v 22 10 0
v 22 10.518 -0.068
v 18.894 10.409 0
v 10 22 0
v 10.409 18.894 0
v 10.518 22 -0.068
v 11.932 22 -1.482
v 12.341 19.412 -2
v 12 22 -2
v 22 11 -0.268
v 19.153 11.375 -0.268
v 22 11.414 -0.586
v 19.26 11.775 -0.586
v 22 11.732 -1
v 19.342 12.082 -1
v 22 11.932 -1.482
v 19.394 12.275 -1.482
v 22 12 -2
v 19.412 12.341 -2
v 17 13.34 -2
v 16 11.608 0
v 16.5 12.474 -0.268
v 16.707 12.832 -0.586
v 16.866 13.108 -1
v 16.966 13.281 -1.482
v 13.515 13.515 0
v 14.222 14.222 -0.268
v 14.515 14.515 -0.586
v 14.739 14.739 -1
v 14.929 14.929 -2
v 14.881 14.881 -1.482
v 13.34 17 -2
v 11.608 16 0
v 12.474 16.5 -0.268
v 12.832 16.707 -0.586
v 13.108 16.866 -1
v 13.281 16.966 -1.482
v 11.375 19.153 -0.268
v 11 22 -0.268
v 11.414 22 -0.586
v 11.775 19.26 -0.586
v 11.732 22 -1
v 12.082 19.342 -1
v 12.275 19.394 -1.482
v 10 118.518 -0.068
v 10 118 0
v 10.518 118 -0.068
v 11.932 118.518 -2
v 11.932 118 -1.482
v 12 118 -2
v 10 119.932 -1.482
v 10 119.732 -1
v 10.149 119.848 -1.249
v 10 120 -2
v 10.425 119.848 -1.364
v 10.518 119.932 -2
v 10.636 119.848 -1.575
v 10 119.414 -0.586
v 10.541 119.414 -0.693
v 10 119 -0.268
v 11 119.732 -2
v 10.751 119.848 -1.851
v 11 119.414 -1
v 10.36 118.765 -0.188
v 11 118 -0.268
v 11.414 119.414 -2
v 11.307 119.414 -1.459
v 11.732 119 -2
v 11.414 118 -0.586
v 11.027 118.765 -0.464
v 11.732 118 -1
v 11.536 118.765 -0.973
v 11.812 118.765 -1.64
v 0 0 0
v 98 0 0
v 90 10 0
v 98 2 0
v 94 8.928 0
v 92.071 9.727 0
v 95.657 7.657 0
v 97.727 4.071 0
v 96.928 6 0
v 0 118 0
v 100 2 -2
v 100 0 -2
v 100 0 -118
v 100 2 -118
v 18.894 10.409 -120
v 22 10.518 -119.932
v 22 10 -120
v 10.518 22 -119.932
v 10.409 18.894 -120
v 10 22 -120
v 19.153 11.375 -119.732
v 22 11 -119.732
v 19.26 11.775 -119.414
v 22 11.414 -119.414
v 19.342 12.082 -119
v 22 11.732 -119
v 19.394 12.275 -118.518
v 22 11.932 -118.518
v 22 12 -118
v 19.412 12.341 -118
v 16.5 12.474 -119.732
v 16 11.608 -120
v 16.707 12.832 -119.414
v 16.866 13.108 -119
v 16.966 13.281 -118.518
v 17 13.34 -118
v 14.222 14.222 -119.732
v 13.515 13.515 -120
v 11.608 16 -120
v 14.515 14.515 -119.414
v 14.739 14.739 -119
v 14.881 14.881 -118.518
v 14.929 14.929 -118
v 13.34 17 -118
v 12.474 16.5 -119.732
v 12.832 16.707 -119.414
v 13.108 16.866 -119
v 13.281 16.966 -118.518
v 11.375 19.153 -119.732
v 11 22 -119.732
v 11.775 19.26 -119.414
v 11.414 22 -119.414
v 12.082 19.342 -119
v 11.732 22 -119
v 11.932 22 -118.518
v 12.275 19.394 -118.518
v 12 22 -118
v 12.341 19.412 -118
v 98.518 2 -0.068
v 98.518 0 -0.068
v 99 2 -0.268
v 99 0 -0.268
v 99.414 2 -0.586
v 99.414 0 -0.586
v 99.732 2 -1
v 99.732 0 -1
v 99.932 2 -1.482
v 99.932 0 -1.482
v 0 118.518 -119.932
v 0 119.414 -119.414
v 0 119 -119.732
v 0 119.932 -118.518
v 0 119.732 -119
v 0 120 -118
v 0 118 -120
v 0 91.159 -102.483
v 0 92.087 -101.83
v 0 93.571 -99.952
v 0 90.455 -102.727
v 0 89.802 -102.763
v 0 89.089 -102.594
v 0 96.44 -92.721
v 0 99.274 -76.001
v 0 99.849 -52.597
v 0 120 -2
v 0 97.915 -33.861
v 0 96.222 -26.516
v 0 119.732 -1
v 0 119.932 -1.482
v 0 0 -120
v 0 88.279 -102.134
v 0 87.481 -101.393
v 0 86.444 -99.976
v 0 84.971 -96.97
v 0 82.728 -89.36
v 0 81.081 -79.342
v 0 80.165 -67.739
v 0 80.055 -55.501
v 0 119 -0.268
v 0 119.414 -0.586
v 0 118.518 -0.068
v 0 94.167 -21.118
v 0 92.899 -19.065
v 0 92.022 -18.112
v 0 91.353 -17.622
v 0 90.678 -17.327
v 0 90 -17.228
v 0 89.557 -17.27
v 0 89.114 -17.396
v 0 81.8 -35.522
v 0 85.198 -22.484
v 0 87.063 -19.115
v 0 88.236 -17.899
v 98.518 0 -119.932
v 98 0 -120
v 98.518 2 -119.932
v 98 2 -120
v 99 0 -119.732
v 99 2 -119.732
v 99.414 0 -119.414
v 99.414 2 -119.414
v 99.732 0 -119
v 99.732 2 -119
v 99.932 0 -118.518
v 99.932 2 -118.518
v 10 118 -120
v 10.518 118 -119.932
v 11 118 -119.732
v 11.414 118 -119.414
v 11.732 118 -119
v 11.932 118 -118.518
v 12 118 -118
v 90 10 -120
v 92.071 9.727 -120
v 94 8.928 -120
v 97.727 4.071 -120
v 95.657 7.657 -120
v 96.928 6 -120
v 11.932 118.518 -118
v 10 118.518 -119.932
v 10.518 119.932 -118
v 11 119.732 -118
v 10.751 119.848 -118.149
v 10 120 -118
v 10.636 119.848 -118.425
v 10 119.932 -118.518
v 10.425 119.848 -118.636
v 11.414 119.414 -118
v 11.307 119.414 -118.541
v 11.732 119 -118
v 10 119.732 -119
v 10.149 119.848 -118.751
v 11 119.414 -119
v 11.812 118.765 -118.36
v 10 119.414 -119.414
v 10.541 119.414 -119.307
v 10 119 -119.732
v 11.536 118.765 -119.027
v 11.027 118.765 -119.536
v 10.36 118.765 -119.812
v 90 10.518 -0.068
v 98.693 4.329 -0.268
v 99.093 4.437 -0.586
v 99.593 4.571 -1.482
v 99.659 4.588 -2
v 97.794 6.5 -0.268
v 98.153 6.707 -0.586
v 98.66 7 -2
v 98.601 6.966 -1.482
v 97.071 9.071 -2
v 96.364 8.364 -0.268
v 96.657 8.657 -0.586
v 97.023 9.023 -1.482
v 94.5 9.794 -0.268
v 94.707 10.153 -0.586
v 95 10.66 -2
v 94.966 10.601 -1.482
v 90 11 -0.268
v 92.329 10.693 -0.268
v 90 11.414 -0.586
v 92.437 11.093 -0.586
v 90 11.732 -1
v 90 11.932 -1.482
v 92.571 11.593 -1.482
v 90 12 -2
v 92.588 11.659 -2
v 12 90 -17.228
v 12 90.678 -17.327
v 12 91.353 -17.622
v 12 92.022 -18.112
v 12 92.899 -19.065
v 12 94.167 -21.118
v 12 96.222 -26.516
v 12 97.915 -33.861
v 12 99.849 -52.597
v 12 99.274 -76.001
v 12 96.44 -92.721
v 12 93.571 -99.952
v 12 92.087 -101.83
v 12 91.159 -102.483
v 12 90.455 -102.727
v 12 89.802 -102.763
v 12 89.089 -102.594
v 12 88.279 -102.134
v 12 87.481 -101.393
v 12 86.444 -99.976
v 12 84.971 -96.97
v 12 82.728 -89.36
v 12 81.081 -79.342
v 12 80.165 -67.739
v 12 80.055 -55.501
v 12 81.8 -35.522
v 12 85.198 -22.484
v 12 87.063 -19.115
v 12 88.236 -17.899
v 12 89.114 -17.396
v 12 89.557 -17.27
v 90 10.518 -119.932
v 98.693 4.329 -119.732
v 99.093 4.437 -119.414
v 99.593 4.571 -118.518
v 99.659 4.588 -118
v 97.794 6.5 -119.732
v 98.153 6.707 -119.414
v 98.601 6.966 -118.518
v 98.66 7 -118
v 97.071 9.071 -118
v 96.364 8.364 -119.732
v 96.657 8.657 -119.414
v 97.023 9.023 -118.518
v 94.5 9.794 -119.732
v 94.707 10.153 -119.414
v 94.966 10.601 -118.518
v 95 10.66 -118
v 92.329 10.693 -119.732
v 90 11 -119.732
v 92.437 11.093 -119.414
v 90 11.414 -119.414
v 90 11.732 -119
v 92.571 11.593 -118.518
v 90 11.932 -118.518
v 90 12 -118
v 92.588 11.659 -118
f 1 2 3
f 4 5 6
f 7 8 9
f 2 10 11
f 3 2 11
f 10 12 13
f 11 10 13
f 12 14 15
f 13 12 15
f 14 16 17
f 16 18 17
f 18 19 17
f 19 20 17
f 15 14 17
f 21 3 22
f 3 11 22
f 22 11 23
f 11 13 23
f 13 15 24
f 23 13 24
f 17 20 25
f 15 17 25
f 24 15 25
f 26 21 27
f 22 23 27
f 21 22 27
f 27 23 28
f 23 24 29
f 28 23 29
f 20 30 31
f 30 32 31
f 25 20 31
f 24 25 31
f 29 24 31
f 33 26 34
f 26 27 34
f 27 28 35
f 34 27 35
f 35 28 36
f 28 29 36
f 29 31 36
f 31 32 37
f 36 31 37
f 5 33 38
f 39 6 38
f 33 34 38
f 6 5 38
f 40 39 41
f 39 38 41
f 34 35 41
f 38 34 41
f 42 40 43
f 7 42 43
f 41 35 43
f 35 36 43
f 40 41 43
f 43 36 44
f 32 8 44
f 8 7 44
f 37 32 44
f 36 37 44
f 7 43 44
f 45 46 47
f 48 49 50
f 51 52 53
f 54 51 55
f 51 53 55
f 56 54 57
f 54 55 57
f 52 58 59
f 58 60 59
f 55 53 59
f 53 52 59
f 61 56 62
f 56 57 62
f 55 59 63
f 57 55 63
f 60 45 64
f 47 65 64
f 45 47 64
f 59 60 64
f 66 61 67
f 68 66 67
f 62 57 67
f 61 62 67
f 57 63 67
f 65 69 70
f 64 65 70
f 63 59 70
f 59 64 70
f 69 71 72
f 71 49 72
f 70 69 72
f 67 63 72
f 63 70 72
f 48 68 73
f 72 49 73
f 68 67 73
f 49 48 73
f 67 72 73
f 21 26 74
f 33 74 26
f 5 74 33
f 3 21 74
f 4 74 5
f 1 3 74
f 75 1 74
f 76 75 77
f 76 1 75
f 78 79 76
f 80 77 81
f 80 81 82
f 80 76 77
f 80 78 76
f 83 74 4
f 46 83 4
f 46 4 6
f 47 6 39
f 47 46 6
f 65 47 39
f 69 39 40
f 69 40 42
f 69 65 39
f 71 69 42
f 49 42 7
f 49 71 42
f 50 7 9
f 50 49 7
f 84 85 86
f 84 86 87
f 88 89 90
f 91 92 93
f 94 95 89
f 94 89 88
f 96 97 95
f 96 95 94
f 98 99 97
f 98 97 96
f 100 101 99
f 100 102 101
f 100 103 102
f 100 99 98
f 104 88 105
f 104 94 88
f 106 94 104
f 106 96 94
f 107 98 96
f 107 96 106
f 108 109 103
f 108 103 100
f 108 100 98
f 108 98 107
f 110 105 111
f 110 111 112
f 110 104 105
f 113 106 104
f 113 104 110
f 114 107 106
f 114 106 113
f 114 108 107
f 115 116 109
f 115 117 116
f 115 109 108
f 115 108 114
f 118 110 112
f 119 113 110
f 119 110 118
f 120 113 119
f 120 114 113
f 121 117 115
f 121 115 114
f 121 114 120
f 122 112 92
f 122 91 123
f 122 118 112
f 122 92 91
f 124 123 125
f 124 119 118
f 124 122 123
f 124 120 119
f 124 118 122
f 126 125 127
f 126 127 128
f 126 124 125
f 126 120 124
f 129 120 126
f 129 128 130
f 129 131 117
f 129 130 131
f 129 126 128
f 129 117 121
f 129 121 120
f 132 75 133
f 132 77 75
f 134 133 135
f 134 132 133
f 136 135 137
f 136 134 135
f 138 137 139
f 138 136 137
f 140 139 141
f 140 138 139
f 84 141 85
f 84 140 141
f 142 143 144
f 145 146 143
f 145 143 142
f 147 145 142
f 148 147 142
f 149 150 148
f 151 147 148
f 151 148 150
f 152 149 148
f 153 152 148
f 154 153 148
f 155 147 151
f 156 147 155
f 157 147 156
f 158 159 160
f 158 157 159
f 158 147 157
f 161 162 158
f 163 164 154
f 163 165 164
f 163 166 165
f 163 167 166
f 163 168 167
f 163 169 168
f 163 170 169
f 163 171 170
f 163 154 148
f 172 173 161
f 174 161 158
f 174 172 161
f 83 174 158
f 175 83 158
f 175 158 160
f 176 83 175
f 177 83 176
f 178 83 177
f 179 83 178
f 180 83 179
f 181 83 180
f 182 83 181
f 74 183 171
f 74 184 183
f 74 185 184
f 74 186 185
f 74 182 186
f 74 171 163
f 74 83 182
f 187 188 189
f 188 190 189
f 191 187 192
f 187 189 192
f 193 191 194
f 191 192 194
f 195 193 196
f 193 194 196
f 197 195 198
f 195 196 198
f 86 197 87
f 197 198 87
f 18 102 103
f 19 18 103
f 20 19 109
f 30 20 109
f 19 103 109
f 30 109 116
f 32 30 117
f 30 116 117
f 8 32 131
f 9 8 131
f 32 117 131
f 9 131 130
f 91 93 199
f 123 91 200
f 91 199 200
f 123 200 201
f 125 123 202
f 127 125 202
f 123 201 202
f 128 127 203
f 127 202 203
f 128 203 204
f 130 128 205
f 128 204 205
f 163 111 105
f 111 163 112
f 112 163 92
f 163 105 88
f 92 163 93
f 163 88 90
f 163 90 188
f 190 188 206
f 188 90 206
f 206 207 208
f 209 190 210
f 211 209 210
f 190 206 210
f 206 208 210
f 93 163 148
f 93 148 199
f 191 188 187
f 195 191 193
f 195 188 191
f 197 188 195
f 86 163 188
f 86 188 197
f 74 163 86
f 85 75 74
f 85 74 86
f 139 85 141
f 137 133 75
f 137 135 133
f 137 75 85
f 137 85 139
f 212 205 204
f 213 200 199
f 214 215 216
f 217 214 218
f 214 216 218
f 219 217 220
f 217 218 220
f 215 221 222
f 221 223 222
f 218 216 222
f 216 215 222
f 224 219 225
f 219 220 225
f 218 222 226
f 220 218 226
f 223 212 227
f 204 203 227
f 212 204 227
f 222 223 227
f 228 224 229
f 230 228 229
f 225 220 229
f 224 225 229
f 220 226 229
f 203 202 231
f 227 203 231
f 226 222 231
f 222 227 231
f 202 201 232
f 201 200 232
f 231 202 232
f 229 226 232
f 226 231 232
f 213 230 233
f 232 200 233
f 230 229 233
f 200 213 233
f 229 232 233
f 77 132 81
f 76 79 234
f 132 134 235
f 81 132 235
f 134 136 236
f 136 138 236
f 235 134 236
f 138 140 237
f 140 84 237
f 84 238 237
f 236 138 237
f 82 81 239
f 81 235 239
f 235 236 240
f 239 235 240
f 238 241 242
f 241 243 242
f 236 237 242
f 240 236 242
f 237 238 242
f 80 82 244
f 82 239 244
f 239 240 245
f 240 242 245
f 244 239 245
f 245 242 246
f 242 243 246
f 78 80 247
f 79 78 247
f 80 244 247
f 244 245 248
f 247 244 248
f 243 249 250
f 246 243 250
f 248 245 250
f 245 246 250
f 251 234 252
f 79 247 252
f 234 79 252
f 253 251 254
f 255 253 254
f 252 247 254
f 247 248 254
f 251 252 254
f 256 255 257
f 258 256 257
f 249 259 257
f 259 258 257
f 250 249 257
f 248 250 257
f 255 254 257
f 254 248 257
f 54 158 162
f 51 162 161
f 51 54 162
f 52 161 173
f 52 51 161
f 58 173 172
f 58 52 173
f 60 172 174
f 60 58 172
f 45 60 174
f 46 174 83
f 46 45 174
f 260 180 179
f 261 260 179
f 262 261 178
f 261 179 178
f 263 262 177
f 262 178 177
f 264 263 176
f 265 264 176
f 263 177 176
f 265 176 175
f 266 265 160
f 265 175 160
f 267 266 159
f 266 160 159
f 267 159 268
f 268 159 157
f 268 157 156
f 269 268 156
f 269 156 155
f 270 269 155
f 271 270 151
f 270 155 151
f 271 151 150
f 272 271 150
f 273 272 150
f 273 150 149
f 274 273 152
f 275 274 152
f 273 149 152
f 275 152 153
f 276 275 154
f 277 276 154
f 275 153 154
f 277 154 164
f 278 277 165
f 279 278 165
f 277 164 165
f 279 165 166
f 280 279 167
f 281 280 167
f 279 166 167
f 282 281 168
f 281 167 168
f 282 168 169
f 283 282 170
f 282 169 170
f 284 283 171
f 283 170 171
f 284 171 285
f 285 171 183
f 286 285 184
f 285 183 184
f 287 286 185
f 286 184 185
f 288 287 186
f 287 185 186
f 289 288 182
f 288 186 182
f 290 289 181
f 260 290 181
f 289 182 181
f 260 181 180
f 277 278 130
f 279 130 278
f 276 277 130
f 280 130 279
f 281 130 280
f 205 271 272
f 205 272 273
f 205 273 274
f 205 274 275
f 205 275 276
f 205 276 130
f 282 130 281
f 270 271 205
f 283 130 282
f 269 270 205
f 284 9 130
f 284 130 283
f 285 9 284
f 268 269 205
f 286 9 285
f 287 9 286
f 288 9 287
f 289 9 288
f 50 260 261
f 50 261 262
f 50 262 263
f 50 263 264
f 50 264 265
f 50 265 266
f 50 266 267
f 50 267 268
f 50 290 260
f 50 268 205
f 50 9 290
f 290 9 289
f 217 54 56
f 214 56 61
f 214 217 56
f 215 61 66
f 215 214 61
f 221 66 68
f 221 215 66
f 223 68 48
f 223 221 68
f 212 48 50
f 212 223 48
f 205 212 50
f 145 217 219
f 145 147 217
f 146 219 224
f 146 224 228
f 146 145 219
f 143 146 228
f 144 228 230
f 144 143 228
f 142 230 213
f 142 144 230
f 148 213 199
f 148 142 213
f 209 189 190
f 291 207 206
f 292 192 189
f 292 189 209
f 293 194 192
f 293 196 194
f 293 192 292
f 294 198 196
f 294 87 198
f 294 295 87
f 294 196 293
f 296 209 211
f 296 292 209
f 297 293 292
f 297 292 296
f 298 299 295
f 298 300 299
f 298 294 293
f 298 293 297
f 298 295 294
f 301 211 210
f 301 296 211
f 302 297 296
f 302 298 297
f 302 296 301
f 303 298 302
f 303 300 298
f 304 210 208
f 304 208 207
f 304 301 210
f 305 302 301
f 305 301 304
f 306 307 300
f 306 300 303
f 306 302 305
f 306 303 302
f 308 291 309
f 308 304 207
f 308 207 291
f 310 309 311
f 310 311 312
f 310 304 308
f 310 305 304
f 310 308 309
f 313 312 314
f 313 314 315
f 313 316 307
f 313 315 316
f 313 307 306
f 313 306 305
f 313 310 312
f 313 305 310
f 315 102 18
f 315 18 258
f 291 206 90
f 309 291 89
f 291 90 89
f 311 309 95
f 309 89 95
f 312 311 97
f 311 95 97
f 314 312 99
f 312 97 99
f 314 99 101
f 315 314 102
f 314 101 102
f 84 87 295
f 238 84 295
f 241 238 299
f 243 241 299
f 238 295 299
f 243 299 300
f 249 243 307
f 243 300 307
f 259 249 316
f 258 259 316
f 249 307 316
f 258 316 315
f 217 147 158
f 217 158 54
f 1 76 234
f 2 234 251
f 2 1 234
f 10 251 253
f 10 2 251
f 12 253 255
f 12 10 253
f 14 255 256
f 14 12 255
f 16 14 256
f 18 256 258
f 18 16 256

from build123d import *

# Parameters (mm, degrees)
ESQUISSE1_W             = 12
ESQUISSE1_H             = 108
ESQUISSE1_W_2           = 100
ESQUISSE1_H_2           = 12
BOSS_EXTRU_1_DEPTH      = 120
ESQUISSE2_RX            = 42.771597922
ESQUISSE2_RY            = 10
ENL_V_MAT_EXTRU_1_DEPTH = 12
CONG_1_R                = 10
CONG_2_R                = 10
CONG_3_R                = 2
CONG_4_R                = 2
CONG_5_R                = 2


with BuildPart() as part:
    # Esquisse1 → Boss.-Extru.1 (new body)
    with BuildSketch(Plane.XY):
        with Locations((6, 66)):
            Rectangle(ESQUISSE1_W, ESQUISSE1_H)
        with Locations((50, 6)):
            Rectangle(ESQUISSE1_W_2, ESQUISSE1_H_2)
    extrude(amount=-BOSS_EXTRU_1_DEPTH)

    # Esquisse2 → Enlèv. mat.-Extru.1 (cut)
    with BuildSketch(Plane.ZY):
        with Locations(Location((-60, 90), (0, 0, 0))):
            Ellipse(ESQUISSE2_RX, ESQUISSE2_RY)
    extrude(amount=-ENL_V_MAT_EXTRU_1_DEPTH, mode=Mode.SUBTRACT)

    # Congé1
    cong_1_edges = [part.edges().sort_by_distance(p)[0] for p in [
        (100, 12, -60),
    ]]
    fillet(cong_1_edges, radius=CONG_1_R)

    # Congé2
    cong_2_edges = [part.edges().sort_by_distance(p)[0] for p in [
        (12, 12, -60),
    ]]
    fillet(cong_2_edges, radius=CONG_2_R)

    # Congé3
    cong_3_edges = [part.edges().sort_by_distance(p)[0] for p in [
        (100, 1, 0),
        (97.071067812, 9.071067812, 0),
        (56, 12, 0),
        (12, 71, 0),
        (14.928932188, 14.928932188, 0),
    ]]
    fillet(cong_3_edges, radius=CONG_3_R)

    # Congé4
    cong_4_edges = [part.edges().sort_by_distance(p)[0] for p in [
        (100, 1, -120),
        (97.071067812, 9.071067812, -120),
        (56, 12, -120),
        (12, 71, -120),
        (14.928932188, 14.928932188, -120),
    ]]
    fillet(cong_4_edges, radius=CONG_4_R)

    # Congé5
    cong_5_edges = [part.edges().sort_by_distance(p)[0] for p in [
        (5, 120, 0),
        (5, 120, -120),
        (11.414213562, 120, -0.585786438),
        (12, 120, -60),
        (11.414213562, 120, -119.414213562),
    ]]
    fillet(cong_5_edges, radius=CONG_5_R)


solid = part.part
